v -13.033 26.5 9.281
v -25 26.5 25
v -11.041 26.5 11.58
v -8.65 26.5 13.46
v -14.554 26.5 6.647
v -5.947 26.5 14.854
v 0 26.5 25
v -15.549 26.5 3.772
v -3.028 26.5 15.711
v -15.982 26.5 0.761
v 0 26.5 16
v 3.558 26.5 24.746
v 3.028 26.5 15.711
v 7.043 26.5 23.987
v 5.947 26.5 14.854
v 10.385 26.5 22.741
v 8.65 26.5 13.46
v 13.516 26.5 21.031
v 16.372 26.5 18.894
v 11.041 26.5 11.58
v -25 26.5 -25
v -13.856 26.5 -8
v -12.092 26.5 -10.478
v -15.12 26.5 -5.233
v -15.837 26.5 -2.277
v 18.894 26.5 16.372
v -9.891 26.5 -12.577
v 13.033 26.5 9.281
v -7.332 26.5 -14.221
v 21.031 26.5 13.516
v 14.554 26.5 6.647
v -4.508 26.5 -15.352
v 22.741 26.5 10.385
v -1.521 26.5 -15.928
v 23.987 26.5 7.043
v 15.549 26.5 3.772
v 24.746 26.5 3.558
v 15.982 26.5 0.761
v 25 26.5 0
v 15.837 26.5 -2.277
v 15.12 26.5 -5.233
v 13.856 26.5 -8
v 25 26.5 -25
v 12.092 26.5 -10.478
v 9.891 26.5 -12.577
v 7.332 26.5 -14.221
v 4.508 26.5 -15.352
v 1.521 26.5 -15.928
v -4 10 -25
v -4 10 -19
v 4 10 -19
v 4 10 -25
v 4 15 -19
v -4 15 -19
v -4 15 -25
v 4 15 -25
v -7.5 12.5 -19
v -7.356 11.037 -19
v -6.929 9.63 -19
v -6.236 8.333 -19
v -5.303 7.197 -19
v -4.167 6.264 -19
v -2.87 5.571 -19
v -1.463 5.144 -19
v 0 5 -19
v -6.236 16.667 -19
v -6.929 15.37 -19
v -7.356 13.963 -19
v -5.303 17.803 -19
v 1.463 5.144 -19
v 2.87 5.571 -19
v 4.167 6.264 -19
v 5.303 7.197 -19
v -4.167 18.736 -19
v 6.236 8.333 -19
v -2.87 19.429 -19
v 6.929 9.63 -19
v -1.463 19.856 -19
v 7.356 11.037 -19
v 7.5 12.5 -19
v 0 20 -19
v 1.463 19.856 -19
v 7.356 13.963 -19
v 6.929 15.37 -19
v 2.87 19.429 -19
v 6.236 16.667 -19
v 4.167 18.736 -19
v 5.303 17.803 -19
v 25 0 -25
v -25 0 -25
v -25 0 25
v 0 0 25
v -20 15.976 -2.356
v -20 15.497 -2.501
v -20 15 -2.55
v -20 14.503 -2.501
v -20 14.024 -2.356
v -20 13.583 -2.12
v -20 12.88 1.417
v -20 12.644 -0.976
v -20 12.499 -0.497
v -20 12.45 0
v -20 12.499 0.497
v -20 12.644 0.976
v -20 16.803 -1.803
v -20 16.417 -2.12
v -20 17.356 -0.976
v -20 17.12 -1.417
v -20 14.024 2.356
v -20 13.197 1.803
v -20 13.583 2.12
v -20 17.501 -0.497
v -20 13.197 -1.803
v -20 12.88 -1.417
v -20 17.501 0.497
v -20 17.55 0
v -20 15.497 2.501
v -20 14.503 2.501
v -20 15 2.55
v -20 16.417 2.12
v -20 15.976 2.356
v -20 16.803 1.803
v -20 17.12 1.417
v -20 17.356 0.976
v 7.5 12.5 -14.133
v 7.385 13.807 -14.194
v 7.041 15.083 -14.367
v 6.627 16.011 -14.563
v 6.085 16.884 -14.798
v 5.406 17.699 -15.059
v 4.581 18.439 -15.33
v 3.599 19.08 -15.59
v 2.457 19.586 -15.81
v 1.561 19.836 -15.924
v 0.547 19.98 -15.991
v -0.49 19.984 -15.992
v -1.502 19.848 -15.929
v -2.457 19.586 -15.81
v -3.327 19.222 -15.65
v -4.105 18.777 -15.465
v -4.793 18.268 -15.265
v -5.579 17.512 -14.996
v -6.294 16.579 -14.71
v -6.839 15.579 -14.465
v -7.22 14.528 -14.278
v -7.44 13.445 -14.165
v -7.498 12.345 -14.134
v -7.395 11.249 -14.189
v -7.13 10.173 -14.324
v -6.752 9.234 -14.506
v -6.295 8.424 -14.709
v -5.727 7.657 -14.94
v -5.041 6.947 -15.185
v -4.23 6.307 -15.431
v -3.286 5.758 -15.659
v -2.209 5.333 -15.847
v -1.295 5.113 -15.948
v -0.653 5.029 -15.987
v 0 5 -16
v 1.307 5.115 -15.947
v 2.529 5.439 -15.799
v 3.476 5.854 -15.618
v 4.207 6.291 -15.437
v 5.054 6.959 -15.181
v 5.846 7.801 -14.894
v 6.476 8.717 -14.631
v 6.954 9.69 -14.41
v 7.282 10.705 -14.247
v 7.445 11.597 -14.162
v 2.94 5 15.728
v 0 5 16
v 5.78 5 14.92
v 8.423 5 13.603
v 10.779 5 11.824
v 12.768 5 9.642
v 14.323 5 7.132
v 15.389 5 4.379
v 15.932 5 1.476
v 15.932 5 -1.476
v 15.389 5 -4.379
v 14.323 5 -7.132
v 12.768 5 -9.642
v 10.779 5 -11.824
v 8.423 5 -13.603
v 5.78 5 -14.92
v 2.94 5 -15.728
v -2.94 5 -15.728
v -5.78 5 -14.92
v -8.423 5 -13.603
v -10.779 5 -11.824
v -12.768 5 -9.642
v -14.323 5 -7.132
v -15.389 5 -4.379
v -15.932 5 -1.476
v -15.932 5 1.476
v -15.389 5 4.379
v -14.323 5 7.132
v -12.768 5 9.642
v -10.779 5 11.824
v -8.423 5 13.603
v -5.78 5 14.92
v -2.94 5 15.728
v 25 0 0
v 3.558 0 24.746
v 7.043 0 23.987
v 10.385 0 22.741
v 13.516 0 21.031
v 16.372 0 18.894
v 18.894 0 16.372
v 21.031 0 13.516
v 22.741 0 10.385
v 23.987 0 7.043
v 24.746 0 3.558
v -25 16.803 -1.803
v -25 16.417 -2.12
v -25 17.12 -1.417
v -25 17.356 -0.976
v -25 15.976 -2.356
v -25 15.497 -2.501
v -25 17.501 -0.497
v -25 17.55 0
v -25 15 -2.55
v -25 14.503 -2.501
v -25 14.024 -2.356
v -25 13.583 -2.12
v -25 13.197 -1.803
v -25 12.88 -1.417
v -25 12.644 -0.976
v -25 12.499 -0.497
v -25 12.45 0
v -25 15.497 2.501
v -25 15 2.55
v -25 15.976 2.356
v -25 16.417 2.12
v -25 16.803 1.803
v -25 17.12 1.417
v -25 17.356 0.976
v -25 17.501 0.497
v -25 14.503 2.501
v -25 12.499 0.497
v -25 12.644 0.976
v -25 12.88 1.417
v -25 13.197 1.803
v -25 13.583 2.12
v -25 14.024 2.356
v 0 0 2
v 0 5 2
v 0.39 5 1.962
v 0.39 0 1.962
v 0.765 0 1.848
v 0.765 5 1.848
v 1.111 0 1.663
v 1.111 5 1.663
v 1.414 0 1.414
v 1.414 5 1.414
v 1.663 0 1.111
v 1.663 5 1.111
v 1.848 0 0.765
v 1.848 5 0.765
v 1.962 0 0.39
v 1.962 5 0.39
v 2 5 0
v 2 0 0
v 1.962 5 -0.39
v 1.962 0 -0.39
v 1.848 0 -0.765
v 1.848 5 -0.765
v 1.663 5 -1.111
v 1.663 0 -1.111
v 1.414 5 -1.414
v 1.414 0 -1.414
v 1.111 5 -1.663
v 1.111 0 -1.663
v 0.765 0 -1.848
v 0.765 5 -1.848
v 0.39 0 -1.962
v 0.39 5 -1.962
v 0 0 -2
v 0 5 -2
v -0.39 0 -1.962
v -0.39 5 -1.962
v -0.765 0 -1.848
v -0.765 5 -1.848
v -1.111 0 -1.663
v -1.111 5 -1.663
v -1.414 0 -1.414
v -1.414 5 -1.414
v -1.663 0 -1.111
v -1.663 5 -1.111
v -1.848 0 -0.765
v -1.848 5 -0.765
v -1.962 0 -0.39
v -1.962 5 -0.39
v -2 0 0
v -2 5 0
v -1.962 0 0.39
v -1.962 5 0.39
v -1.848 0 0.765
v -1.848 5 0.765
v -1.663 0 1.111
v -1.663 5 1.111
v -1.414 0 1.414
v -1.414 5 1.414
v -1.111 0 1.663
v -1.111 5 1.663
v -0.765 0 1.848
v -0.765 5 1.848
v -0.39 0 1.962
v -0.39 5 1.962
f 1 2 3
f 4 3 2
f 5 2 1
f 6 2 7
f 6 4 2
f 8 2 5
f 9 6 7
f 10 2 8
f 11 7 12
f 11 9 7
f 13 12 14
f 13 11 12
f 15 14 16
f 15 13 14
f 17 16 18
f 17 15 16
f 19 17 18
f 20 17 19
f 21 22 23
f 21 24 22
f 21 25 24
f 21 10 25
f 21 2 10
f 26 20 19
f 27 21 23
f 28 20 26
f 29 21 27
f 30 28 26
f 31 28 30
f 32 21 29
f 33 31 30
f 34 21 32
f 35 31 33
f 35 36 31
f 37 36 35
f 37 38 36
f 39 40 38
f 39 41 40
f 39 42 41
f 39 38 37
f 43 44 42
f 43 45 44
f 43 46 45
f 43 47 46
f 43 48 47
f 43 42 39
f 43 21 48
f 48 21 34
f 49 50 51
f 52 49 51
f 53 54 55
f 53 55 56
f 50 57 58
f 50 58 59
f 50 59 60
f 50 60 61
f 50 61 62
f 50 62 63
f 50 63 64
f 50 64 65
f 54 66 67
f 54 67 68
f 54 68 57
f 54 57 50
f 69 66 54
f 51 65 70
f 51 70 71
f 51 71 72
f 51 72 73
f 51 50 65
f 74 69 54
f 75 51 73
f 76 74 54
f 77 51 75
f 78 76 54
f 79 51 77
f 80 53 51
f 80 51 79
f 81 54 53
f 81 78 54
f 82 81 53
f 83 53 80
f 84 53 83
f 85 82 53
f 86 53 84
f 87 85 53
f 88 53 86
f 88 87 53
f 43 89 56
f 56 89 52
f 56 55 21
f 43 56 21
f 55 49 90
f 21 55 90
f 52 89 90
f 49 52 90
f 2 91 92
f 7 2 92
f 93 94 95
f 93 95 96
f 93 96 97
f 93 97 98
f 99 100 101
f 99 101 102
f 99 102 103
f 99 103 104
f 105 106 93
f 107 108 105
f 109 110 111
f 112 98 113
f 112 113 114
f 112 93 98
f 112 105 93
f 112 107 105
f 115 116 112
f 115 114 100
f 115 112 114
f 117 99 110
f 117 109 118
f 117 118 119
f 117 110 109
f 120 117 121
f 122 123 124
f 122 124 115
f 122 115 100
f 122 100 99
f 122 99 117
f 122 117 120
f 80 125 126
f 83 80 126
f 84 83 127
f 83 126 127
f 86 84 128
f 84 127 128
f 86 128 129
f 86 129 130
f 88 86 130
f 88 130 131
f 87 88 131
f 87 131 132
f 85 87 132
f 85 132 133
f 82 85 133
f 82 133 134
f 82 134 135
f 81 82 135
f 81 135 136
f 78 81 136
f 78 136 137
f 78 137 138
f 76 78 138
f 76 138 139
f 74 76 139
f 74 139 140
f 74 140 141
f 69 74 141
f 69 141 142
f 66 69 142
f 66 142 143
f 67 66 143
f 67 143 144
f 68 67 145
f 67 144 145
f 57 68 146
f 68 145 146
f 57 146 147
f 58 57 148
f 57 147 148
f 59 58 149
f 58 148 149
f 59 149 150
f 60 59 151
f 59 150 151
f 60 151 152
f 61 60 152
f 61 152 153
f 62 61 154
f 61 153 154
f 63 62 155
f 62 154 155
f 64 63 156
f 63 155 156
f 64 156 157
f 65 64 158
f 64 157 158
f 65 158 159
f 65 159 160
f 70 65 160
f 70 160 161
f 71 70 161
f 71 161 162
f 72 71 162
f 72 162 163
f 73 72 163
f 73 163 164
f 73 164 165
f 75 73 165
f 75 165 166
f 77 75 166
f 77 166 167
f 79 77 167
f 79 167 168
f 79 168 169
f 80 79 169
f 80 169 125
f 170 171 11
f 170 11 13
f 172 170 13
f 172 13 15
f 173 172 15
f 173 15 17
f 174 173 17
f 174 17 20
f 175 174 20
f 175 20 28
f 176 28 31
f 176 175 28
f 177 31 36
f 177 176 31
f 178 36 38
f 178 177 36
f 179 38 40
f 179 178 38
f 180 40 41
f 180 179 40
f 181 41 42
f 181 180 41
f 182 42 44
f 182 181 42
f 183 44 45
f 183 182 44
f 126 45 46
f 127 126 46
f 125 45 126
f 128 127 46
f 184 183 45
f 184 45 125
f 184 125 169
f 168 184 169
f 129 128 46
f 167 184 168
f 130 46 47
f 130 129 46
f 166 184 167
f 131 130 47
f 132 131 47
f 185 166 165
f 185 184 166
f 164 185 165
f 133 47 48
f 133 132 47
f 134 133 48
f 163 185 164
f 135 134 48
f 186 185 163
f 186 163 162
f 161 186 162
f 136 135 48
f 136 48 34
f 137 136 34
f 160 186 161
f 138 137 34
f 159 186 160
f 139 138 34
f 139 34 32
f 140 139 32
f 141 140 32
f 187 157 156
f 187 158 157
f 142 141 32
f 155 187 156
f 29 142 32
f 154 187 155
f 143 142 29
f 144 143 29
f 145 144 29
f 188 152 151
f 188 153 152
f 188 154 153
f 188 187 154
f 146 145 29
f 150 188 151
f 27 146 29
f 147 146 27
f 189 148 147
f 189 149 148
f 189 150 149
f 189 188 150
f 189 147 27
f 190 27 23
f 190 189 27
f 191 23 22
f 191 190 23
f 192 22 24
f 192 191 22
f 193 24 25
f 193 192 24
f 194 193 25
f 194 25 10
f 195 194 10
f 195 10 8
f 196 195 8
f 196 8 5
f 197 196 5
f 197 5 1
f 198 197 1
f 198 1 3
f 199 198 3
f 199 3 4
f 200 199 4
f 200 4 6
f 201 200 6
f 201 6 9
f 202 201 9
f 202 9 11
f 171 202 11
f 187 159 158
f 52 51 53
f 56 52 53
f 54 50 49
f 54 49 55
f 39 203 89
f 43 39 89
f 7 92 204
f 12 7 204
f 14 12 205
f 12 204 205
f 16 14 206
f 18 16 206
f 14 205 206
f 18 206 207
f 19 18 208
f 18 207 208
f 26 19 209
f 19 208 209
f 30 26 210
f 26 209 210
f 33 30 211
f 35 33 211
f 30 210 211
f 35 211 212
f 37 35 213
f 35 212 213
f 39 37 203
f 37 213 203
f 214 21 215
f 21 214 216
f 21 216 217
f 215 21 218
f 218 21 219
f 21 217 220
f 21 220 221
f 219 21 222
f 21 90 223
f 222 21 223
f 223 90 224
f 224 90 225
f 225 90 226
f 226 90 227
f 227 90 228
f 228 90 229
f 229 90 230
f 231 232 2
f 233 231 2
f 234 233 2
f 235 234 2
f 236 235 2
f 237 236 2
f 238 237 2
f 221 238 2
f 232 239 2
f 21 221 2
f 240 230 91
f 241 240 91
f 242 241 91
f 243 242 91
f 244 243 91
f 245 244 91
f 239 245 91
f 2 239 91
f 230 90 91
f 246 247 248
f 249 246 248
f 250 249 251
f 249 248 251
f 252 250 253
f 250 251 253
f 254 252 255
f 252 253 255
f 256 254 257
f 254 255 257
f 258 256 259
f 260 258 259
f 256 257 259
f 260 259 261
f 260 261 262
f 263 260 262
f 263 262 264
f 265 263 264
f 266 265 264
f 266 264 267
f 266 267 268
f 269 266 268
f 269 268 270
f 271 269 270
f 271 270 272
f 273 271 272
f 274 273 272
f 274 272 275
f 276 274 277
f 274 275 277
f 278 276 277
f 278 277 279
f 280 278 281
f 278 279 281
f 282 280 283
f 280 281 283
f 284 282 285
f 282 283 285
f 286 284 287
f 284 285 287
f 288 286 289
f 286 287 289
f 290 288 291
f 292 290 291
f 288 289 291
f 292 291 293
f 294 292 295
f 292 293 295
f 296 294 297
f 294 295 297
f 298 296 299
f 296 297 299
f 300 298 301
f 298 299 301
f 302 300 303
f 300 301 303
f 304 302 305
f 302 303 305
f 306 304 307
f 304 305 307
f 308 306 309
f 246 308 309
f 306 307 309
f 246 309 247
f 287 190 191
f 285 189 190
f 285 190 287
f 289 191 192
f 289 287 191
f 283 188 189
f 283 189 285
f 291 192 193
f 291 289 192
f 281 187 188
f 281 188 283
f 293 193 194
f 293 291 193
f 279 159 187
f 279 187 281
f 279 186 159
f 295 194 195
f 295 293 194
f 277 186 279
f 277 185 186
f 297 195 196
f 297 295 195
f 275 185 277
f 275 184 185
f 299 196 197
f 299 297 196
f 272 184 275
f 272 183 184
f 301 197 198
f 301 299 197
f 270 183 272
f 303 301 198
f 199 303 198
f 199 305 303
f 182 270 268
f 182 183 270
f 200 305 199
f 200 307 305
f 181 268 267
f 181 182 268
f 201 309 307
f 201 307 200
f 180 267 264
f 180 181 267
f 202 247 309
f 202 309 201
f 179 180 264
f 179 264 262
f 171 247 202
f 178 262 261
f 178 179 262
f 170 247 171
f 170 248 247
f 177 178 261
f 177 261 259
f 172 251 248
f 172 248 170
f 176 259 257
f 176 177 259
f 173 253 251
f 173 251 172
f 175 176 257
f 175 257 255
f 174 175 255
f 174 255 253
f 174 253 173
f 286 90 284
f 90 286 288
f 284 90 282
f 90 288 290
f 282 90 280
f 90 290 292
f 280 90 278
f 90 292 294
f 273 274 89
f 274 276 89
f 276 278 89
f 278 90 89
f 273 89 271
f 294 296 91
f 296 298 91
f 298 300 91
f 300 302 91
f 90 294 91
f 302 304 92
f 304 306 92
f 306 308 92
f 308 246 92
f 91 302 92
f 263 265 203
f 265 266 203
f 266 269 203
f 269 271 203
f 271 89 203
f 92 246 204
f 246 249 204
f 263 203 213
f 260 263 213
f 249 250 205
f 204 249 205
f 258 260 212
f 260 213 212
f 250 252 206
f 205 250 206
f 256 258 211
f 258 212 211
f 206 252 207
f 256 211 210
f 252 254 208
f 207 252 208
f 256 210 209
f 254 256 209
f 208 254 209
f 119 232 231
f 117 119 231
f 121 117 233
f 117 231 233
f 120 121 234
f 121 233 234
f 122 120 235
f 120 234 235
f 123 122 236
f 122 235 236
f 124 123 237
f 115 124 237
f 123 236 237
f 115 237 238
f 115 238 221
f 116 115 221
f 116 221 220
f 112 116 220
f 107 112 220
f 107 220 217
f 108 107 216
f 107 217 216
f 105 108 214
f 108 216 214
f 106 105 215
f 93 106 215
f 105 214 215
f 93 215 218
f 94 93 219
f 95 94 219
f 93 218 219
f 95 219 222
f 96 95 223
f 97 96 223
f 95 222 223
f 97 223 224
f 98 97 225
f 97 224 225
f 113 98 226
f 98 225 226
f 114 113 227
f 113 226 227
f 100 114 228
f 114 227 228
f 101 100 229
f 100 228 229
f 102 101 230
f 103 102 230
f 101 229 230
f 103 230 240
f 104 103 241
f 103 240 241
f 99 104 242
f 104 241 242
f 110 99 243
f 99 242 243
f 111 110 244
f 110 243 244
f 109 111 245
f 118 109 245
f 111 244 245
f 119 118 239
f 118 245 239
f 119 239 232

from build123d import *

# Parameters (mm, degrees)
SKETCH1_R           = 16
BOSS_EXTRUDE1_DEPTH = 26.5
SKETCH1_3_R         = 16
BOSS_EXTRUDE2_DEPTH = 5
SKETCH2_R           = 2
CUT_EXTRUDE1_DEPTH  = 5
SKETCH3_R           = 2.55
CUT_EXTRUDE2_DEPTH  = 5
SKETCH5_R           = 7.5
CUT_EXTRUDE8_DEPTH  = 19
SKETCH6_W           = 8
SKETCH6_H           = 5
CUT_EXTRUDE9_DEPTH  = 19


with BuildPart() as part:
    # Sketch1 → Boss-Extrude1 (new body)
    with BuildSketch(Plane(origin=(0, 0, 0), x_dir=(1, 0, 0), z_dir=(0, 1, 0))):
        with BuildLine():
            Line((-25, 25), (-25, -25))
            Line((-25, -25), (0, -25))
            ThreePointArc((0, -25), (17.67766953, -17.67766953), (25, 0))
            Line((25, 0), (25, 25))
            Line((25, 25), (-25, 25))
        make_face()
        Circle(SKETCH1_R, mode=Mode.SUBTRACT)
    extrude(amount=BOSS_EXTRUDE1_DEPTH)

    # Sketch1<3> → Boss-Extrude2 (add)
    with BuildSketch(Plane(origin=(0, 0, 0), x_dir=(1, 0, 0), z_dir=(0, 1, 0))):
        Circle(SKETCH1_3_R)
    extrude(amount=BOSS_EXTRUDE2_DEPTH)

    # Sketch2 → Cut-Extrude1 (cut)
    with BuildSketch(Plane(origin=(0, 5, 0), x_dir=(1, 0, 0), z_dir=(0, 1, 0))):
        Circle(SKETCH2_R)
    extrude(amount=-CUT_EXTRUDE1_DEPTH, mode=Mode.SUBTRACT)

    # Sketch3 → Cut-Extrude2 (cut)
    with BuildSketch(Plane.ZY.offset(25)):
        with Locations((0, 15)):
            Circle(SKETCH3_R)
    extrude(amount=-CUT_EXTRUDE2_DEPTH, mode=Mode.SUBTRACT)

    # Sketch5 → Cut-Extrude8 (cut)
    with BuildSketch(Plane.XY):
        with Locations((0, 12.5)):
            Circle(SKETCH5_R)
    extrude(amount=-CUT_EXTRUDE8_DEPTH, mode=Mode.SUBTRACT)

    # Sketch6 → Cut-Extrude9 (cut)
    with BuildSketch(Plane.XY.offset(-19)):
        with Locations((0, 12.5)):
            Rectangle(SKETCH6_W, SKETCH6_H)
    extrude(amount=-CUT_EXTRUDE9_DEPTH, mode=Mode.SUBTRACT)


solid = part.part
